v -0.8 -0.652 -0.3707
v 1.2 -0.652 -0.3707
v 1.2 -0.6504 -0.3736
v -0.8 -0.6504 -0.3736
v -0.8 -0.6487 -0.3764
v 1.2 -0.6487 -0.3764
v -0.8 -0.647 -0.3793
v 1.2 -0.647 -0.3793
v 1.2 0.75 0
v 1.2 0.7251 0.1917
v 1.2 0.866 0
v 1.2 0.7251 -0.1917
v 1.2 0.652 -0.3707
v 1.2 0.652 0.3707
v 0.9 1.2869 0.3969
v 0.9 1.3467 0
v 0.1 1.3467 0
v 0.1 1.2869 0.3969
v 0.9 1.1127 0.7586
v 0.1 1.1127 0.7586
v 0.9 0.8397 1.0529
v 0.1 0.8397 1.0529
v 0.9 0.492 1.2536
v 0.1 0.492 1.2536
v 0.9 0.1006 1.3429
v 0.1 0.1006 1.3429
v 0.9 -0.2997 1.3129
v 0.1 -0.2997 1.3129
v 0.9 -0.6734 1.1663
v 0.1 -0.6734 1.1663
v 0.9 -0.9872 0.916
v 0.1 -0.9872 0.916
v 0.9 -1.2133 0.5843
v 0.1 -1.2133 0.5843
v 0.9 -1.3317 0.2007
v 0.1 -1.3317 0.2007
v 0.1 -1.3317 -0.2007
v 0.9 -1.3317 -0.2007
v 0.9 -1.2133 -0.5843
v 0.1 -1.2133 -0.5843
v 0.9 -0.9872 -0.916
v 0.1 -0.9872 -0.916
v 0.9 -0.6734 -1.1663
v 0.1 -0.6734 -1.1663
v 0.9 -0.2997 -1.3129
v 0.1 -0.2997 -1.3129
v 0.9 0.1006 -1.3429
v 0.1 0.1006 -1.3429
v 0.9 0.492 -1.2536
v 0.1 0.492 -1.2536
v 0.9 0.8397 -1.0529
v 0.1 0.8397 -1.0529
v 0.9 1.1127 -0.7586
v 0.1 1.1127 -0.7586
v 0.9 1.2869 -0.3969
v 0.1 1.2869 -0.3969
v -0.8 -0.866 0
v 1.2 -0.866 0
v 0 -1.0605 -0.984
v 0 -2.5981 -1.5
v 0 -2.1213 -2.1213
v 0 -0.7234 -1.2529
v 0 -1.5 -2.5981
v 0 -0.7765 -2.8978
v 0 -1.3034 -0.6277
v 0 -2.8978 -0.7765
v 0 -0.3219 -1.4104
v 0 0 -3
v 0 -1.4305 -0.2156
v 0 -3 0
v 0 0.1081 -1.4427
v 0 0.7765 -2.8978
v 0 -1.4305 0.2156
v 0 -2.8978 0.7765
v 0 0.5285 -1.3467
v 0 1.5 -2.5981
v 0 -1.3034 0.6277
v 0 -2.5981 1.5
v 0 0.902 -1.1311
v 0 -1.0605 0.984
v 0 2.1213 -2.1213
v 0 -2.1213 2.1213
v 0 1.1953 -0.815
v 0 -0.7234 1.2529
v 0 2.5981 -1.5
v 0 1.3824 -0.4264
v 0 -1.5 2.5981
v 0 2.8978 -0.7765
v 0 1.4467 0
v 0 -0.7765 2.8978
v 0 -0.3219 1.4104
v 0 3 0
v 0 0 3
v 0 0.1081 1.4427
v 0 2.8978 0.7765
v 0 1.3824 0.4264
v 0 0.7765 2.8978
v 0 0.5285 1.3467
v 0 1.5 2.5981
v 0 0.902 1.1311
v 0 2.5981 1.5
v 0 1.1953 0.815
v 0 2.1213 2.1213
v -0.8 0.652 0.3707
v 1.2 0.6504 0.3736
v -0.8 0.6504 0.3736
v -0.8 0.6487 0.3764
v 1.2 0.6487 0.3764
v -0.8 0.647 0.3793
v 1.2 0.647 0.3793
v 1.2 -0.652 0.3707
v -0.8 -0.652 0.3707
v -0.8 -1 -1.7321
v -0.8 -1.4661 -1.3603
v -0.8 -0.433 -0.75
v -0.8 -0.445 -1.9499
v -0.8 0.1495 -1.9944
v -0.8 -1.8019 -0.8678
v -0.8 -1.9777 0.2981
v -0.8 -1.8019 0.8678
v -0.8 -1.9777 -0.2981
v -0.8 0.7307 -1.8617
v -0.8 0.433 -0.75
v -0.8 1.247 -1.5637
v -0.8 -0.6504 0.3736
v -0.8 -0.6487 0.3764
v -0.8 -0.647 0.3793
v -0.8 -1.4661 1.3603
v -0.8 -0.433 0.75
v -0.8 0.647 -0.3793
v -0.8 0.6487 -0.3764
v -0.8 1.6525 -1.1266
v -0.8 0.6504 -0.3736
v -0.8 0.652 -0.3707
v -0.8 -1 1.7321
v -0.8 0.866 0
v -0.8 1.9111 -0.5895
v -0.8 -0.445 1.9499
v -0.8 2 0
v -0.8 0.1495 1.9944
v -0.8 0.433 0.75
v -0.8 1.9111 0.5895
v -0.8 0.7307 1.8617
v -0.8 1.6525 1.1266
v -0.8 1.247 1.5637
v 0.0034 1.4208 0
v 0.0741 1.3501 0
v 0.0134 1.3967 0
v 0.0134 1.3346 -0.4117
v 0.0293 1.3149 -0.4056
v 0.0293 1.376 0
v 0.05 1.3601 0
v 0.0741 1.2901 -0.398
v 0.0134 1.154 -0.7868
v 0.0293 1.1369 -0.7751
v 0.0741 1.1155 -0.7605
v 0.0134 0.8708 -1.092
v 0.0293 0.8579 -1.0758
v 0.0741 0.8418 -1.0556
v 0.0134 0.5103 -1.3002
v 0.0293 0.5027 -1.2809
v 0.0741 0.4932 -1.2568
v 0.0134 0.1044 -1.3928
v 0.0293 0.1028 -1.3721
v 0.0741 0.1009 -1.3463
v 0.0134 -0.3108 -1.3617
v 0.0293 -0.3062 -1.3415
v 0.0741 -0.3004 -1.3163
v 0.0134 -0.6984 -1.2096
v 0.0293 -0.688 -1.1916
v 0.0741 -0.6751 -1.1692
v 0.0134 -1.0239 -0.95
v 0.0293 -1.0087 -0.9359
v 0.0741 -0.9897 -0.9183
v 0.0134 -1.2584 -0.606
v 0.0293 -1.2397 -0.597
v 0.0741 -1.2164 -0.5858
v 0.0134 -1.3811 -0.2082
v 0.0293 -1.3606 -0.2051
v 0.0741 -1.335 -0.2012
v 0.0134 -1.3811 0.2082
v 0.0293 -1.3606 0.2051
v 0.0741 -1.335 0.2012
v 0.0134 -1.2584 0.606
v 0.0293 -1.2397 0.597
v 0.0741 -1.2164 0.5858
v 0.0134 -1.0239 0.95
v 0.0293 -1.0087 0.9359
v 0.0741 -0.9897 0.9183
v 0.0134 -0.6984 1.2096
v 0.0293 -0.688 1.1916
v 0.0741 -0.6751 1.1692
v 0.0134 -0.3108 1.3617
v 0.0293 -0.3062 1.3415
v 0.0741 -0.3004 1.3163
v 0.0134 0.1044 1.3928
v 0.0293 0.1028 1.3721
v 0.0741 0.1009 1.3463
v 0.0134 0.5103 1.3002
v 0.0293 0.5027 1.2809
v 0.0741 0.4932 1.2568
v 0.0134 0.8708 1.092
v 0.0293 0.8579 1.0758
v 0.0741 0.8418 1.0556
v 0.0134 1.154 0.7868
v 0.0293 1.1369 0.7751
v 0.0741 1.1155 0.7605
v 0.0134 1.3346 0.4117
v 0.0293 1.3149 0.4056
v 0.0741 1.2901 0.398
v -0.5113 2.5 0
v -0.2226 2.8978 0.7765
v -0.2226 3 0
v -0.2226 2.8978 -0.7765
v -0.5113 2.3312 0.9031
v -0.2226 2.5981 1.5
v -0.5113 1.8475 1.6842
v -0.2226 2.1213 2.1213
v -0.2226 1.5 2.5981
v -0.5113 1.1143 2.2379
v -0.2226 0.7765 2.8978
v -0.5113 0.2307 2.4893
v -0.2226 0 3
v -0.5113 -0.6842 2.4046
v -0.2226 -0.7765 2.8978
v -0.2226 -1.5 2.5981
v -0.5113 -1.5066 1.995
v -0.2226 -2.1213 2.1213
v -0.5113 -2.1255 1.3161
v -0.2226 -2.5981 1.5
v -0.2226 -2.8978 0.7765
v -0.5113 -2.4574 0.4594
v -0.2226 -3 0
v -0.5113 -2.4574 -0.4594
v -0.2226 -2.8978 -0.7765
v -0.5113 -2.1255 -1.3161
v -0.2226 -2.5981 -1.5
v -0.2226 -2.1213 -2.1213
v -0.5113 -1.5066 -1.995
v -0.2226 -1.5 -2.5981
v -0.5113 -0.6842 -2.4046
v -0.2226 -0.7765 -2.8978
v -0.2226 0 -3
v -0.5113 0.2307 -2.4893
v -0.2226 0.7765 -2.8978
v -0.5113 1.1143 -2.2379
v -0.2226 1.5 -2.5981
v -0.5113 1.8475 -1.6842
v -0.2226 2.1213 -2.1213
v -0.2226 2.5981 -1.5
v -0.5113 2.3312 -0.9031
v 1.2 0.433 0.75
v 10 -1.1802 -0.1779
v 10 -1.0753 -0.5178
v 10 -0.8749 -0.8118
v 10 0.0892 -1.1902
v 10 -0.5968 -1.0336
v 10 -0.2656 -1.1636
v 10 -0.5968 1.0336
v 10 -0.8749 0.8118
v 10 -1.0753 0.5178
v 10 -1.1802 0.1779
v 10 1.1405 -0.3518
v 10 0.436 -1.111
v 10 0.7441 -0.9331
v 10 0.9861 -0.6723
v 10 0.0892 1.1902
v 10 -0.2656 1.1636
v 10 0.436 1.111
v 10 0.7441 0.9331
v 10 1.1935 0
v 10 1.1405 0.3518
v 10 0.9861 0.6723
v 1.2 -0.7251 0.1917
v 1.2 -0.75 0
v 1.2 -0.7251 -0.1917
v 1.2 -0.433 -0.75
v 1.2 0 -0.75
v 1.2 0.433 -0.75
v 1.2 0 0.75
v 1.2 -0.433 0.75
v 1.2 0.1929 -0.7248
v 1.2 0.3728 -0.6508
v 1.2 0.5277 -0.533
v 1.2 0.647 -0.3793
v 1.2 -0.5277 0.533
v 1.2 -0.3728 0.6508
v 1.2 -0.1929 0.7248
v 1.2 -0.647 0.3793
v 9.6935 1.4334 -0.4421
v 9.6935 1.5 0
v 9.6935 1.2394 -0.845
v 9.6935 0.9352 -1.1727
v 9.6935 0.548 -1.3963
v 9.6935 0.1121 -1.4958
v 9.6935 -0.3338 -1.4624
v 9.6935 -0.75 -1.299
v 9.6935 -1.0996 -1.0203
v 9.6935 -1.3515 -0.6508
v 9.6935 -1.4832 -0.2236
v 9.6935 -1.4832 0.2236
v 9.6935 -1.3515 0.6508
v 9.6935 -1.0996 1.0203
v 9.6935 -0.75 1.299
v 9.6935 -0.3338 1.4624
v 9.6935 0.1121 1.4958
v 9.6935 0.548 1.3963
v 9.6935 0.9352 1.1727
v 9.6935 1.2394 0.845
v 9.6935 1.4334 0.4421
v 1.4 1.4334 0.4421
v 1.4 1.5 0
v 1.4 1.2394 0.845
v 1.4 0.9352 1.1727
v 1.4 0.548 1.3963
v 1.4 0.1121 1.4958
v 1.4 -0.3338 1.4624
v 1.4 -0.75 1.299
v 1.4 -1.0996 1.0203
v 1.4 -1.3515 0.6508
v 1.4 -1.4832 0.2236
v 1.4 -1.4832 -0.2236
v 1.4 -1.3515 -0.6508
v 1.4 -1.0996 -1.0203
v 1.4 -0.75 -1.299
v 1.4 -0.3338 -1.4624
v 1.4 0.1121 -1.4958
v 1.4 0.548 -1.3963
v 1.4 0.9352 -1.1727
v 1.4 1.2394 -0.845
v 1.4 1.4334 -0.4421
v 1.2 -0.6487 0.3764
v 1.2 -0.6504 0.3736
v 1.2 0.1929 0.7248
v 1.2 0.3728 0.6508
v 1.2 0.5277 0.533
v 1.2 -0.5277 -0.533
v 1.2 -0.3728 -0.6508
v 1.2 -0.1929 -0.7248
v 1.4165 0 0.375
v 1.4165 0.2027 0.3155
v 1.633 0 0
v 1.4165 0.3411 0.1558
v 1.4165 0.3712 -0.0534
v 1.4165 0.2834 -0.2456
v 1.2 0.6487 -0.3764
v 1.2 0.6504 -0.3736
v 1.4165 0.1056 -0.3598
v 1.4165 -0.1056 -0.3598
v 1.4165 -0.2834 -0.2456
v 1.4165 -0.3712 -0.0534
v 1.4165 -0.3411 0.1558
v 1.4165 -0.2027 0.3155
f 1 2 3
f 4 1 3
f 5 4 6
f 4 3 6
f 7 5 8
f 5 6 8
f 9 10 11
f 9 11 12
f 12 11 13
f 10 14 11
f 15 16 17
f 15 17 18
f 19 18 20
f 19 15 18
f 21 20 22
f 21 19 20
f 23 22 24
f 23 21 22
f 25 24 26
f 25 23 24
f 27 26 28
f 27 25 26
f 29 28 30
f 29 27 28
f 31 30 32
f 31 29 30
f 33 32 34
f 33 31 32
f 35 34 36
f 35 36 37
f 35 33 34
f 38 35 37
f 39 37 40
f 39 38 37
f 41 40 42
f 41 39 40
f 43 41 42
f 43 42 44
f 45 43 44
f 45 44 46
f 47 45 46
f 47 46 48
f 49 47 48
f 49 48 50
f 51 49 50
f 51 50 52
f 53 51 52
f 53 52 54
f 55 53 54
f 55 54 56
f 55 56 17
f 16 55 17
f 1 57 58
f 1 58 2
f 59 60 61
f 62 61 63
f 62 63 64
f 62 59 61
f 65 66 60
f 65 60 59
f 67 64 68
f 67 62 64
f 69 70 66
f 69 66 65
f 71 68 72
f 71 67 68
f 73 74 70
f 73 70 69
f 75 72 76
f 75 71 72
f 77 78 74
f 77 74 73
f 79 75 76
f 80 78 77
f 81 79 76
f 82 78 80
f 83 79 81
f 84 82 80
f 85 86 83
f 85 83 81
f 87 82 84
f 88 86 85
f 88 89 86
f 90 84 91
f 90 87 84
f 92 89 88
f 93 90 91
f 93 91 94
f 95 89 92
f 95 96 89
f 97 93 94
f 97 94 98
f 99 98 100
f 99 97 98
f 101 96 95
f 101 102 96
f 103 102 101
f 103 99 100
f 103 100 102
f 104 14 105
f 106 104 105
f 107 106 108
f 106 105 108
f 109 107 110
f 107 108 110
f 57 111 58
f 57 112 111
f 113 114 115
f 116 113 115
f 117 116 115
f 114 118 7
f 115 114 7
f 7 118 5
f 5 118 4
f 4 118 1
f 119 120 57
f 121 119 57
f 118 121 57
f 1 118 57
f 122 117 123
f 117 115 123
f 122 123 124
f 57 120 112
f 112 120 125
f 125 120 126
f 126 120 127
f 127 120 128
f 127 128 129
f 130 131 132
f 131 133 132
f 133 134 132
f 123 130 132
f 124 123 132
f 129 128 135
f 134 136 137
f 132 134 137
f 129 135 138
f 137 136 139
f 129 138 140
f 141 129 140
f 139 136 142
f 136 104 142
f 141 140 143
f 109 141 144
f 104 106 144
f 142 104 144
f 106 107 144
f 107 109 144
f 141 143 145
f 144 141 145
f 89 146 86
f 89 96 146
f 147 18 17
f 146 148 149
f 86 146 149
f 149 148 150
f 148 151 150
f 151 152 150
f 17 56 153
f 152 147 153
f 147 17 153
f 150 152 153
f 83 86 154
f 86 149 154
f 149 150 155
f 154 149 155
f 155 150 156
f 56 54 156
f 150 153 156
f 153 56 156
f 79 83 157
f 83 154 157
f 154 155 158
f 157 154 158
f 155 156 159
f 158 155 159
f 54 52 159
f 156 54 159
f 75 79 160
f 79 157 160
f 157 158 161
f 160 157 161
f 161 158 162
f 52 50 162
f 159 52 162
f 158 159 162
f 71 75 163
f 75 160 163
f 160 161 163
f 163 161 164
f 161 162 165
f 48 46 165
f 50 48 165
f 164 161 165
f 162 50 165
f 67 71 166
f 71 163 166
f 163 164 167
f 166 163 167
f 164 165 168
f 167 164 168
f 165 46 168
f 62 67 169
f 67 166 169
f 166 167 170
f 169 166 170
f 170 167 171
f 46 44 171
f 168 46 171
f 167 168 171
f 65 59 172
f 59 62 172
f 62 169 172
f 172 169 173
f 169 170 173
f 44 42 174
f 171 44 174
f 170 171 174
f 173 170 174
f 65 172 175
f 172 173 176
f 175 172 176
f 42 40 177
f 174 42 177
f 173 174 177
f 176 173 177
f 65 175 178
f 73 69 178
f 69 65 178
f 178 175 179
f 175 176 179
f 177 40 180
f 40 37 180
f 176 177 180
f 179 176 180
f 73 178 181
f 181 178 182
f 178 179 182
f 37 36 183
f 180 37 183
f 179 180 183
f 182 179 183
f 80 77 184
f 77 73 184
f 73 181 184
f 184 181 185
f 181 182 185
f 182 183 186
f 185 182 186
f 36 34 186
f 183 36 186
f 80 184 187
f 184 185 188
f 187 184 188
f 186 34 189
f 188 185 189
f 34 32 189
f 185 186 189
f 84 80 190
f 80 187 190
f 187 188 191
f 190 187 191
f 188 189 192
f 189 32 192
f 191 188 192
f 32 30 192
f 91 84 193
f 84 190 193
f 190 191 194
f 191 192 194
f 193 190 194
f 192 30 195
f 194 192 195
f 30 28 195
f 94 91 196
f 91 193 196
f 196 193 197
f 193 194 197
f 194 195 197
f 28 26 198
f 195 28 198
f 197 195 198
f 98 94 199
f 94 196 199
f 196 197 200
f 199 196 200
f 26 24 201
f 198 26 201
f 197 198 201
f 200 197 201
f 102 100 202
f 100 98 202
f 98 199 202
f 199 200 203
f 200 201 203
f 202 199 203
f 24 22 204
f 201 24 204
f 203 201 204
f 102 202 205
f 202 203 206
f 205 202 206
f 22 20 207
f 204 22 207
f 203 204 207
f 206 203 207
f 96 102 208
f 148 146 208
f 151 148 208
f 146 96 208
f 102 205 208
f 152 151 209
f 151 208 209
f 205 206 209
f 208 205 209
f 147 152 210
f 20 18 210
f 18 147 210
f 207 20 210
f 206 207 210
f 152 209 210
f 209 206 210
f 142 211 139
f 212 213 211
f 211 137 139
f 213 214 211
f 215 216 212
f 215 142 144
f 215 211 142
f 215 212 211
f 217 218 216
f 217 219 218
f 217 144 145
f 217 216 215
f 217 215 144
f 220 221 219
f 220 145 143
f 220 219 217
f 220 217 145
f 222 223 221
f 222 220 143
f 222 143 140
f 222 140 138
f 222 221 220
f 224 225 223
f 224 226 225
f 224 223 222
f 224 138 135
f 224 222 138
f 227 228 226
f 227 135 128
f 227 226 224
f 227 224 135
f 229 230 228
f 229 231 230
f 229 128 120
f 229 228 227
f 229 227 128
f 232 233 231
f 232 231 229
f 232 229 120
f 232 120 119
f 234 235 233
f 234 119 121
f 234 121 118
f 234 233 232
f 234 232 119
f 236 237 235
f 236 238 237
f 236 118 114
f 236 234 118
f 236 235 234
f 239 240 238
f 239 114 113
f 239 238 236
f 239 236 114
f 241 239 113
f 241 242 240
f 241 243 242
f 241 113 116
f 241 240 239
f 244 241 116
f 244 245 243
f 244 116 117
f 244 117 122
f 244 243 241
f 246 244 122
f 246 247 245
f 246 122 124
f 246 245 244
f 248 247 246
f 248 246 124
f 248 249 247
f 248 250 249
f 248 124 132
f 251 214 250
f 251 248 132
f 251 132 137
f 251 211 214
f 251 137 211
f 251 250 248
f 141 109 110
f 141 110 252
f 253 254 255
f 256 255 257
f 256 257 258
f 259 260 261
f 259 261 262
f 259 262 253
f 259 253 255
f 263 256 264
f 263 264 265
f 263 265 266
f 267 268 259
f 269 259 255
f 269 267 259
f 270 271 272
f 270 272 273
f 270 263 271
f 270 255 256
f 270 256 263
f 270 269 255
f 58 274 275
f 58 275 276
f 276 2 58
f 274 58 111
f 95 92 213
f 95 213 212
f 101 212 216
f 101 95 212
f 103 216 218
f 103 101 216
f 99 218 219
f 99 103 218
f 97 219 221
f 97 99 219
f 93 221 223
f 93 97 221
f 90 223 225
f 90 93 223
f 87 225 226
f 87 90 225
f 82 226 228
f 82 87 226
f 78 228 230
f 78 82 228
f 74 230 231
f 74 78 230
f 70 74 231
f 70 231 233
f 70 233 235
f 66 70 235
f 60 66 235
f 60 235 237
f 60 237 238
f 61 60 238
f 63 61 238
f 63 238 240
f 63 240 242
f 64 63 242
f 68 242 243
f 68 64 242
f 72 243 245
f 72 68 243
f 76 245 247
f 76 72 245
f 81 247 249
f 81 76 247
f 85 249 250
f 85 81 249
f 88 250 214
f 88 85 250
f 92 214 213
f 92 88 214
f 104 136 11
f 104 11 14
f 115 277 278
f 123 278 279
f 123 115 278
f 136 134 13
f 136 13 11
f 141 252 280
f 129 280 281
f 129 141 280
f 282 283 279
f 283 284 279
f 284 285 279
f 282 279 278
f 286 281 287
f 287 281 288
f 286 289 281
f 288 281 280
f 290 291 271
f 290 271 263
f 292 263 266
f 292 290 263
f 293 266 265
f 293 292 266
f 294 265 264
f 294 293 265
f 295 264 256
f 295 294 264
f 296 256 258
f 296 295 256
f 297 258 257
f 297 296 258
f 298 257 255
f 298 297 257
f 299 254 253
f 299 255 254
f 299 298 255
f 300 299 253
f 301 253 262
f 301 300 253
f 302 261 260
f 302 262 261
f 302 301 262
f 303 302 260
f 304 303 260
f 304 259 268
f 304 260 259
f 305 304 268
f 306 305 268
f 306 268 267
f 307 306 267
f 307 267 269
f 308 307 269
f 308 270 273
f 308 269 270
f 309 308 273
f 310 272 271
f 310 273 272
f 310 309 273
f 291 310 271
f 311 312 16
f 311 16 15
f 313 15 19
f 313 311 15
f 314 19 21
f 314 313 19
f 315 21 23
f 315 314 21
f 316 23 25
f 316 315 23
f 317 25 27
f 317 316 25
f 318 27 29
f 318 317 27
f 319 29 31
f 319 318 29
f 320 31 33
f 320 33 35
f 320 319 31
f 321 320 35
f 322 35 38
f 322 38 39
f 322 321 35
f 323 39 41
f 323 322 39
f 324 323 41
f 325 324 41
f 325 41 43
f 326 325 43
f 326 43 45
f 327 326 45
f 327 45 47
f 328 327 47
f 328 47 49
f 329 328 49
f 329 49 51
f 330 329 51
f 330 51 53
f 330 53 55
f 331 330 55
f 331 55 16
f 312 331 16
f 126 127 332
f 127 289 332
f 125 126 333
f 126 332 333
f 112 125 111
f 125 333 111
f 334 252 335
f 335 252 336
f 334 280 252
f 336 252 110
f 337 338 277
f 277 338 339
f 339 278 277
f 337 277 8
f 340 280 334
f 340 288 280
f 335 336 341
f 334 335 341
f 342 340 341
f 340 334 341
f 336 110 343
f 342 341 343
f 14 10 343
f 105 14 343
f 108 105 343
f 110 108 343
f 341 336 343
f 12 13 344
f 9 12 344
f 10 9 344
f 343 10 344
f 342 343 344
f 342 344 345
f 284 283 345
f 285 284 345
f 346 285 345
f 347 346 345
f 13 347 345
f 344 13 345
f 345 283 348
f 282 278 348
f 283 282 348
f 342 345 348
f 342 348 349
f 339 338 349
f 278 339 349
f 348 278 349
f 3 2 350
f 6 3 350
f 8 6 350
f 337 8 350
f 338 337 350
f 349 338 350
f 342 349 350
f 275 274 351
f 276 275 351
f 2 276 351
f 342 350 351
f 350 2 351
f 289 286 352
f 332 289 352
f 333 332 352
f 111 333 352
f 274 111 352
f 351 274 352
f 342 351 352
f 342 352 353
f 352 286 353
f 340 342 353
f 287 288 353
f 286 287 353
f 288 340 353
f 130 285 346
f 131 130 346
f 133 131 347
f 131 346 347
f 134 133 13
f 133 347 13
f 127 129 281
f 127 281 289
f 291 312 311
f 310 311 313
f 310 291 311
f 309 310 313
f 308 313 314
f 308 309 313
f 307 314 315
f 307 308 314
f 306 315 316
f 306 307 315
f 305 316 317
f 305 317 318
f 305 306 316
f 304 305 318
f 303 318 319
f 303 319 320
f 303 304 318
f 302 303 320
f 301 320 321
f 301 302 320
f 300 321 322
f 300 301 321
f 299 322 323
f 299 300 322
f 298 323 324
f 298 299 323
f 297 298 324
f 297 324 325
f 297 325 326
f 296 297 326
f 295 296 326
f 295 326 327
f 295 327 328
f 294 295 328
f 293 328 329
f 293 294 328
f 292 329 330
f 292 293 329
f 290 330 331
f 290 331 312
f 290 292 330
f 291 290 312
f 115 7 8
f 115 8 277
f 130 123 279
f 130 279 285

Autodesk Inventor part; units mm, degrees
ref_plane "YZ Plane" through (0, 0, 0) normal (1, 0, 0) x (0, 1, 0)
ref_plane "XZ Plane" through (0, 0, 0) normal (0, 1, 0) x (-1, 0, 0)
ref_plane "XY Plane" through (0, 0, 0) normal (0, 0, 1) x (1, 0, 0)
sketch "Sketch_1" plane through (0, 0, 0) normal (0, 0, 1) x (1, 0, 0)
  line L0 (10, 0) -> (-0.8, 0)
  line L1 (-0.8, 0) -> (-0.8, 2)
  line L2 (-0.8, 2) -> (-0.2226, 3)
  line L3 (-0.2226, 3) -> (0, 3)
  line L4 (0, 3) -> (0, 1.4467)
  arc A0 (0, 1.4467) -> (0.1, 1.3467) centre (0.1, 1.4467) ccw
  line L5 (0.1, 1.3467) -> (0.9, 1.3467)
  line L6 (0.9, 1.3467) -> (1.4, 1.5)
  line L7 (1.4, 1.5) -> (9.6935, 1.5)
  line L8 (9.6935, 1.5) -> (10, 1.1935)
  line L9 (10, 1.1935) -> (10, 0)
  line L10 (10, 0) -> (-0.8, 0)
revolve "Revolution1" add sketch "Sketch_1" angle 360 about axis through (10, 0, 0) along (1, 0, 0)
thread "Thread1" size "M3x0.5" class "6g" standard "ISO Metric profile" full length
sketch "Sketch2" plane through (-0.8, 0, 0) normal (-1, 0, 0) x (0, 0, 1)
  point P0 (0, 0)
hole "Hole1" at (-0.8, 0, 0) direction (1, 0, 0) diameter 1.5 depth 2 tip angle 120
sketch "Sketch_3" plane through (-0.8, 0, 0) normal (1, 0, 0) x (0, 0, -1)
  line L0 (-0.75, -0.433) -> (0, -0.866)
  line L1 (0, -0.866) -> (0.75, -0.433)
  line L2 (0.75, -0.433) -> (0.75, 0.433)
  line L3 (0.75, 0.433) -> (0, 0.866)
  line L4 (0, 0.866) -> (-0.75, 0.433)
  line L5 (-0.75, 0.433) -> (-0.75, -0.433)
extrude "Extrusion1" cut sketch "Sketch_3" along normal blind 2
properties part number "CBSTSR3-10" material "鋼、炭素鋼"
